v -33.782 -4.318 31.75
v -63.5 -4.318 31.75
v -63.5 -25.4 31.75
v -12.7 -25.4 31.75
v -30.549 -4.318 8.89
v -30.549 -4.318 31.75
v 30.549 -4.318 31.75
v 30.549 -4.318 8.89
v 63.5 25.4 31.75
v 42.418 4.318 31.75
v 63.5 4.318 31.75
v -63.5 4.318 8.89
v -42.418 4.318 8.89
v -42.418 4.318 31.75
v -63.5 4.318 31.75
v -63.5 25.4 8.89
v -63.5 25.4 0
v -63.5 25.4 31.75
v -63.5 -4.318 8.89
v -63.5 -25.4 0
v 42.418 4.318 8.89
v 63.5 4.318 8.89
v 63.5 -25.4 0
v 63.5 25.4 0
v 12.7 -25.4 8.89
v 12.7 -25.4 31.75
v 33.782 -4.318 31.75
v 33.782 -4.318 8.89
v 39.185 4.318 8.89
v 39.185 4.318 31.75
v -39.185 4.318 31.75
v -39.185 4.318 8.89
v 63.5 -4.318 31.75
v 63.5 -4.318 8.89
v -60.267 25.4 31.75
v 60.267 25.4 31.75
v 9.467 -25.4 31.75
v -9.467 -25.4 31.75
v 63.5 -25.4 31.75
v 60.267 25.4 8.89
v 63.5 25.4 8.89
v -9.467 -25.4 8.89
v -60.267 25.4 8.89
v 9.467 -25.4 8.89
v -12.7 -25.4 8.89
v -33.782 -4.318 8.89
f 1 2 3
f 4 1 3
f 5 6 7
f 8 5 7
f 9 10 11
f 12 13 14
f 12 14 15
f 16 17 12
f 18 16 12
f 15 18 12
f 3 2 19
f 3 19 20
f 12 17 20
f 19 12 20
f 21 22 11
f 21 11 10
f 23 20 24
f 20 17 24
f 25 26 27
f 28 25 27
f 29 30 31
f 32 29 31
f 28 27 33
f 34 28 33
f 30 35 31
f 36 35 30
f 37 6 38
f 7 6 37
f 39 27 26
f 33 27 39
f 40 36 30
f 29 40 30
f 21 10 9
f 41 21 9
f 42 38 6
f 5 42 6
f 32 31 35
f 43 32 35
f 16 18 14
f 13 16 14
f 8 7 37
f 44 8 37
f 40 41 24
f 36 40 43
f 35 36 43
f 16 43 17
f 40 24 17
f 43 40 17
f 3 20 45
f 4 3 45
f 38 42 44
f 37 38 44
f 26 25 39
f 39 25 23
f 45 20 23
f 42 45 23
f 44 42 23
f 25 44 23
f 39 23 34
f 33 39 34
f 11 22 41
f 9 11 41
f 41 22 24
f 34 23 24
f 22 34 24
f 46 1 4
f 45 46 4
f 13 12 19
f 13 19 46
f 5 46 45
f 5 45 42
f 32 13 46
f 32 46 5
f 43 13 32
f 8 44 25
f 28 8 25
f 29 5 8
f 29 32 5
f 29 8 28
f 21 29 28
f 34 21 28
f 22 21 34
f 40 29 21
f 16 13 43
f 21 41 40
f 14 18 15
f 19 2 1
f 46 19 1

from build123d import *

# Parameters (mm, degrees)
BOSS_EXTRUDE1_DEPTH = 31.75
CUT_EXTRUDE1_DEPTH  = 22.86


with BuildPart() as part:
    # Sketch1 → Boss-Extrude1 (new body)
    with BuildSketch(Plane.XY):
        Polygon((63.5, -4.318), (33.782, -4.318), (12.7, -25.4), (63.5, -25.4), align=None)
        Polygon((9.467107796, -25.4), (30.549107796, -4.318), (-30.549107796, -4.318), (-9.467107796, -25.4), align=None)
        Polygon((-12.7, -25.4), (-33.782, -4.318), (-63.5, -4.318), (-63.5, -25.4), align=None)
        Polygon((12.7, -25.4), (33.782, -4.318), (30.549107796, -4.318), (9.467107796, -25.4), align=None)
        Polygon((-9.467107796, -25.4), (-30.549107796, -4.318), (-33.782, -4.318), (-12.7, -25.4), align=None)
        Polygon((39.185107796, 4.318), (60.267107796, 25.4), (-60.267107796, 25.4), (-39.185107796, 4.318), align=None)
        Polygon((30.549107796, -4.318), (39.185107796, 4.318), (-39.185107796, 4.318), (-30.549107796, -4.318), align=None)
        Polygon((63.5, 4.318), (63.5, 25.4), (42.418, 4.318), align=None)
        Polygon((63.5, 4.318), (42.418, 4.318), (33.782, -4.318), (63.5, -4.318), align=None)
        Polygon((33.782, -4.318), (42.418, 4.318), (39.185107796, 4.318), (30.549107796, -4.318), align=None)
        Polygon((42.418, 4.318), (63.5, 25.4), (60.267107796, 25.4), (39.185107796, 4.318), align=None)
        Polygon((-42.418, 4.318), (-63.5, 25.4), (-63.5, 4.318), align=None)
        Polygon((-39.185107796, 4.318), (-60.267107796, 25.4), (-63.5, 25.4), (-42.418, 4.318), align=None)
        Polygon((-33.782, -4.318), (-42.418, 4.318), (-63.5, 4.318), (-63.5, -4.318), align=None)
        Polygon((-30.549107796, -4.318), (-39.185107796, 4.318), (-42.418, 4.318), (-33.782, -4.318), align=None)
    extrude(amount=BOSS_EXTRUDE1_DEPTH)

    # Sketch2 → Cut-Extrude1 (cut)
    with BuildSketch(Plane.XY.offset(31.75)):
        Polygon((63.5, 25.4), (60.267107796, 25.4), (39.185107796, 4.318), (42.418, 4.318), align=None)
        Polygon((42.418, 4.318), (39.185107796, 4.318), (30.549107796, -4.318), (33.782, -4.318), align=None)
        Polygon((33.782, -4.318), (30.549107796, -4.318), (9.467107796, -25.4), (12.7, -25.4), align=None)
        Polygon((30.549107796, -4.318), (39.185107796, 4.318), (-39.185107796, 4.318), (-30.549107796, -4.318), align=None)
        Polygon((63.5, 4.318), (42.418, 4.318), (33.782, -4.318), (63.5, -4.318), align=None)
        Polygon((-9.467107796, -25.4), (-30.549107796, -4.318), (-33.782, -4.318), (-12.7, -25.4), align=None)
        Polygon((-30.549107796, -4.318), (-39.185107796, 4.318), (-42.418, 4.318), (-33.782, -4.318), align=None)
        Polygon((-39.185107796, 4.318), (-60.267107796, 25.4), (-63.5, 25.4), (-42.418, 4.318), align=None)
        Polygon((-33.782, -4.318), (-42.418, 4.318), (-63.5, 4.318), (-63.5, -4.318), align=None)
    extrude(amount=-CUT_EXTRUDE1_DEPTH, mode=Mode.SUBTRACT)


solid = part.part
